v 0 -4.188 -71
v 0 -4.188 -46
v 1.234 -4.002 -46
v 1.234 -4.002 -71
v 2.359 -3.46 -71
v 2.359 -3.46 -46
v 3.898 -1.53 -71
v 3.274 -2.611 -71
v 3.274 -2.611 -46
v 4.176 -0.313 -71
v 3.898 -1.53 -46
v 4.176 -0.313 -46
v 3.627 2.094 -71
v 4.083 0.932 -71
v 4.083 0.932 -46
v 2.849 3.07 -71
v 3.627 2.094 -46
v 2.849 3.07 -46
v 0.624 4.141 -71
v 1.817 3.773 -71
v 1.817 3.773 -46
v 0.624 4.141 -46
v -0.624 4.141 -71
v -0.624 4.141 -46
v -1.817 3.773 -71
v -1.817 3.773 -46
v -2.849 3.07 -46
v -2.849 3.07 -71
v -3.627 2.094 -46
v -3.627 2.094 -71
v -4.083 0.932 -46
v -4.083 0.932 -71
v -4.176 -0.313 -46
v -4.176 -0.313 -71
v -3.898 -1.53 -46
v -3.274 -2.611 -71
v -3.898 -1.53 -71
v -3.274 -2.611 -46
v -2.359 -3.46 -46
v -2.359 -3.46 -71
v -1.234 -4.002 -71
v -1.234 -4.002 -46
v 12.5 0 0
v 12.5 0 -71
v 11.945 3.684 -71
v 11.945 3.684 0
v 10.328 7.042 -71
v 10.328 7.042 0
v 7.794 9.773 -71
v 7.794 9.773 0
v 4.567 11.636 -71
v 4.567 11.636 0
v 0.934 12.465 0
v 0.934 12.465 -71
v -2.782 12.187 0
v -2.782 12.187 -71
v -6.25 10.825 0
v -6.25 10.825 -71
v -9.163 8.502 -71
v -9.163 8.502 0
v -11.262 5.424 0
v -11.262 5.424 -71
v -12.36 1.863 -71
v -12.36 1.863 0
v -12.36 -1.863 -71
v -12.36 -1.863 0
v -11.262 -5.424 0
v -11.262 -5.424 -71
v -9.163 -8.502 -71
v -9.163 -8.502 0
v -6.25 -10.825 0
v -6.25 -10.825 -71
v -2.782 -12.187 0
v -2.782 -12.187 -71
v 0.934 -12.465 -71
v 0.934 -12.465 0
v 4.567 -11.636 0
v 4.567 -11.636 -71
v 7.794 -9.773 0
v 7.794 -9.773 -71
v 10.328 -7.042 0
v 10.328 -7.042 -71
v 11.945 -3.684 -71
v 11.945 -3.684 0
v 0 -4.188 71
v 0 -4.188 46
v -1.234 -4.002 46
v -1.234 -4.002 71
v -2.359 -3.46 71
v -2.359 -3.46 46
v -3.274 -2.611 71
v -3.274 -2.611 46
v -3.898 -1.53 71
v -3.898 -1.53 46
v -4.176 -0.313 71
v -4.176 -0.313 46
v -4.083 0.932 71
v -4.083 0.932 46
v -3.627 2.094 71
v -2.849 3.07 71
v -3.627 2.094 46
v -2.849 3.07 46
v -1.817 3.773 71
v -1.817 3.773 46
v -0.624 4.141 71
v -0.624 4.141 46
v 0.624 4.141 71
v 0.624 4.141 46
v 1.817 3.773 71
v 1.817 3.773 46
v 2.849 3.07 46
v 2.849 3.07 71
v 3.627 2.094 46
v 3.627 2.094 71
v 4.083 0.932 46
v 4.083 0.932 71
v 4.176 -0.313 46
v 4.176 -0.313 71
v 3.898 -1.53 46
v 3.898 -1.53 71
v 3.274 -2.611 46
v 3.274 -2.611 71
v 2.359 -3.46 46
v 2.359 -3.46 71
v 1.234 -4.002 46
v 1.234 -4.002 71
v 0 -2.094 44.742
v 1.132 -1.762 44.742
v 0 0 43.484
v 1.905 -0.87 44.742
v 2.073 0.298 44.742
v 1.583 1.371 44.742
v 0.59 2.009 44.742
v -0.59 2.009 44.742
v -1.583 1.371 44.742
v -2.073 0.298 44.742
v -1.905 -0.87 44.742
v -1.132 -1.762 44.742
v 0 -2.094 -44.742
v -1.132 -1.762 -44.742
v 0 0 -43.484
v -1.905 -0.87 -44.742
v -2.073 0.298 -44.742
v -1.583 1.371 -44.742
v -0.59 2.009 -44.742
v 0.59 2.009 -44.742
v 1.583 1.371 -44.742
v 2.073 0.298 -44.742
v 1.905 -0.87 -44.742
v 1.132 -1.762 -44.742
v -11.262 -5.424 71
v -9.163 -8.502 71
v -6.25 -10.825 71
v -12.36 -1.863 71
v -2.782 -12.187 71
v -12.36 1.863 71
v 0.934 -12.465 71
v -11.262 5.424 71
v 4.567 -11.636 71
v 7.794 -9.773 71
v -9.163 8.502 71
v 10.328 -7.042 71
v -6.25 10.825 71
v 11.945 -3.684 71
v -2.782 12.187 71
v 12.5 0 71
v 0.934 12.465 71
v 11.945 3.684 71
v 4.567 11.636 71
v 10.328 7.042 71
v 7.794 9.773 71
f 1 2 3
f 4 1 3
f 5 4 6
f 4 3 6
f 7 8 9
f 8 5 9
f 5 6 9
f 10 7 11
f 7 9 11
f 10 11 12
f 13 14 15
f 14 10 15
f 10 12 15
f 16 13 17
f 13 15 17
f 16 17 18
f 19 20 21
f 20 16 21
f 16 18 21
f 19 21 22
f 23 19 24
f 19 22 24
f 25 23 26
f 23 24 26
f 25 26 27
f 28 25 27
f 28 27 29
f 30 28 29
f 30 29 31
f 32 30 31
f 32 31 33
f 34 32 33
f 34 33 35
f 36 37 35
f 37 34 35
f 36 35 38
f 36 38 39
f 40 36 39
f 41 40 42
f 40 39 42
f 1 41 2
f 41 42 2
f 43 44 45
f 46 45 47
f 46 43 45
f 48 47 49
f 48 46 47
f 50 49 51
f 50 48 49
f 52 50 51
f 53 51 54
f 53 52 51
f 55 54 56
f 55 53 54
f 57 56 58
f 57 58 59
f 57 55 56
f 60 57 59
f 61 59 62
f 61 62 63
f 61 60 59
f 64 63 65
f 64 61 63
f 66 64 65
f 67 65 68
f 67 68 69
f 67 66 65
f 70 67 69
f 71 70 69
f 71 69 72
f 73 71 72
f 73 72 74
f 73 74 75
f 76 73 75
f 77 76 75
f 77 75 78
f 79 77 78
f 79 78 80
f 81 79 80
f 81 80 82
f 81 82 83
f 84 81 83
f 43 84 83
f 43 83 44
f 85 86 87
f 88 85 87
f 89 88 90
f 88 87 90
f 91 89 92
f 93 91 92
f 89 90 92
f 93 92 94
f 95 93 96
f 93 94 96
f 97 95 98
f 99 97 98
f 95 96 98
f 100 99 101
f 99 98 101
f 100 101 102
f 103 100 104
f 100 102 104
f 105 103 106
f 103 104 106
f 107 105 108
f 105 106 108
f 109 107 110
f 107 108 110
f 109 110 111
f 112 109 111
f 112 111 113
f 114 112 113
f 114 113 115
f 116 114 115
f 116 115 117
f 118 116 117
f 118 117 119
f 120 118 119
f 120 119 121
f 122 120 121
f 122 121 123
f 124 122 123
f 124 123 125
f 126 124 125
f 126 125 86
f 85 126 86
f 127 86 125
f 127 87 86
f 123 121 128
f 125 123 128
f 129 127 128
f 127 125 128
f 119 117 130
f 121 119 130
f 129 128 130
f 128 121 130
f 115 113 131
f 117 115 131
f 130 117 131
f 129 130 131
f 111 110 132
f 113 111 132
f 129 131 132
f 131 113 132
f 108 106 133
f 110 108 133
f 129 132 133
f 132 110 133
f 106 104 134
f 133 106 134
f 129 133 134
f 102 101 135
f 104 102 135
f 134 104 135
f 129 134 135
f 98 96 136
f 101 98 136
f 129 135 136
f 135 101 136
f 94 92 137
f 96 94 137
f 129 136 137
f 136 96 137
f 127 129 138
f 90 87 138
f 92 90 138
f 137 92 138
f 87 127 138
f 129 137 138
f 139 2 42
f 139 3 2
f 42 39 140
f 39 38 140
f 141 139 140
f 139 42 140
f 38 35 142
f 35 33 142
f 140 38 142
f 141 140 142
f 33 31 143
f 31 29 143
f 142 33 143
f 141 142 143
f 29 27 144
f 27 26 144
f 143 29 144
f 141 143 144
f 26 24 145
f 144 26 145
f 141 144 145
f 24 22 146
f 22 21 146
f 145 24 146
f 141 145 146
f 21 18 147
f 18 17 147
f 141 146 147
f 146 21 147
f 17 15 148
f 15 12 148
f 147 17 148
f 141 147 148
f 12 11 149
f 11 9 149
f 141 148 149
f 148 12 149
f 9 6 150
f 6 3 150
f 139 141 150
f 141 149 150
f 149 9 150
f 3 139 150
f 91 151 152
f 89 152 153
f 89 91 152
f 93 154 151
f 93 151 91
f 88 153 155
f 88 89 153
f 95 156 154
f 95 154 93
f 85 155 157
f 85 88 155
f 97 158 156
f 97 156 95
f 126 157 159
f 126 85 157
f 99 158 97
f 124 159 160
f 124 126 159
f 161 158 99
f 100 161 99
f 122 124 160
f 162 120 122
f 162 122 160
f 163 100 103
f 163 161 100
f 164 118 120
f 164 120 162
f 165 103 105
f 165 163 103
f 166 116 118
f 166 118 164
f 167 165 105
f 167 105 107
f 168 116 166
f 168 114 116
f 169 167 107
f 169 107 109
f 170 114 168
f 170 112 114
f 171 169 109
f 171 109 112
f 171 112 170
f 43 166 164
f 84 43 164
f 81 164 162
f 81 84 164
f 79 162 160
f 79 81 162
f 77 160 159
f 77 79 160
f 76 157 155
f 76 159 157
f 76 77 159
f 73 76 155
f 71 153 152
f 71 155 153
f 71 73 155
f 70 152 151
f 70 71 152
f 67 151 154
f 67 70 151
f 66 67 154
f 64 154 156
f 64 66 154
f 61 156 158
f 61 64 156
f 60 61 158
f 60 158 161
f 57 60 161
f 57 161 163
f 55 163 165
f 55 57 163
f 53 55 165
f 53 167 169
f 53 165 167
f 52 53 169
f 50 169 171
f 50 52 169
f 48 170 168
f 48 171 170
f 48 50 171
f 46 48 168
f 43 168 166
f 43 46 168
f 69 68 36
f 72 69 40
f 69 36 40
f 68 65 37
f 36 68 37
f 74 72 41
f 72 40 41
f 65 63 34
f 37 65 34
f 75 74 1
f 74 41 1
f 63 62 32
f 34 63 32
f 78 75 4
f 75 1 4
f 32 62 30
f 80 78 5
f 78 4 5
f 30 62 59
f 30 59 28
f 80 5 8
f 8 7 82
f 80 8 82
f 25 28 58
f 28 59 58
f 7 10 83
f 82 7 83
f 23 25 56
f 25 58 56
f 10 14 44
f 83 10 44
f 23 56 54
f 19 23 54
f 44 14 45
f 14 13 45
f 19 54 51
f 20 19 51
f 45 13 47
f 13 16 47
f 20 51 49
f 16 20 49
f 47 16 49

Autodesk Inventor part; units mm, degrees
ref_plane "YZ Plane" through (0, 0, 0) normal (1, 0, 0) x (0, 1, 0)
ref_plane "XZ Plane" through (0, 0, 0) normal (0, 1, 0) x (-1, 0, 0)
ref_plane "XY Plane" through (0, 0, 0) normal (0, 0, 1) x (1, 0, 0)
sketch "Sketch1" plane through (0, 0, 0) normal (0, 0, 1) x (1, 0, 0)
  circle A0 centre (0, 0) radius 12.5
  dimension "d0" = 25
extrude "Extrusion1" add sketch "Sketch1" along normal mid plane 142
sketch "Sketch2" plane through (0, 0, 71) normal (0, 0, 1) x (1, 0, 0)
  circle A0 centre (0, 0) radius 12.5 projected
hole "Hole1" at (0, 0, 71) direction (0, 0, -1) diameter 8.376 depth 25 tip angle 118 thread size "M10x1.5" class "6H" standard "ISO Metric profile"
mirror "Mirror1" about plane through (0, 0, 0) normal (0, 0, 1) of "Hole1"
properties part number "ADSK-MH-10013" material "Steel, Mild"
